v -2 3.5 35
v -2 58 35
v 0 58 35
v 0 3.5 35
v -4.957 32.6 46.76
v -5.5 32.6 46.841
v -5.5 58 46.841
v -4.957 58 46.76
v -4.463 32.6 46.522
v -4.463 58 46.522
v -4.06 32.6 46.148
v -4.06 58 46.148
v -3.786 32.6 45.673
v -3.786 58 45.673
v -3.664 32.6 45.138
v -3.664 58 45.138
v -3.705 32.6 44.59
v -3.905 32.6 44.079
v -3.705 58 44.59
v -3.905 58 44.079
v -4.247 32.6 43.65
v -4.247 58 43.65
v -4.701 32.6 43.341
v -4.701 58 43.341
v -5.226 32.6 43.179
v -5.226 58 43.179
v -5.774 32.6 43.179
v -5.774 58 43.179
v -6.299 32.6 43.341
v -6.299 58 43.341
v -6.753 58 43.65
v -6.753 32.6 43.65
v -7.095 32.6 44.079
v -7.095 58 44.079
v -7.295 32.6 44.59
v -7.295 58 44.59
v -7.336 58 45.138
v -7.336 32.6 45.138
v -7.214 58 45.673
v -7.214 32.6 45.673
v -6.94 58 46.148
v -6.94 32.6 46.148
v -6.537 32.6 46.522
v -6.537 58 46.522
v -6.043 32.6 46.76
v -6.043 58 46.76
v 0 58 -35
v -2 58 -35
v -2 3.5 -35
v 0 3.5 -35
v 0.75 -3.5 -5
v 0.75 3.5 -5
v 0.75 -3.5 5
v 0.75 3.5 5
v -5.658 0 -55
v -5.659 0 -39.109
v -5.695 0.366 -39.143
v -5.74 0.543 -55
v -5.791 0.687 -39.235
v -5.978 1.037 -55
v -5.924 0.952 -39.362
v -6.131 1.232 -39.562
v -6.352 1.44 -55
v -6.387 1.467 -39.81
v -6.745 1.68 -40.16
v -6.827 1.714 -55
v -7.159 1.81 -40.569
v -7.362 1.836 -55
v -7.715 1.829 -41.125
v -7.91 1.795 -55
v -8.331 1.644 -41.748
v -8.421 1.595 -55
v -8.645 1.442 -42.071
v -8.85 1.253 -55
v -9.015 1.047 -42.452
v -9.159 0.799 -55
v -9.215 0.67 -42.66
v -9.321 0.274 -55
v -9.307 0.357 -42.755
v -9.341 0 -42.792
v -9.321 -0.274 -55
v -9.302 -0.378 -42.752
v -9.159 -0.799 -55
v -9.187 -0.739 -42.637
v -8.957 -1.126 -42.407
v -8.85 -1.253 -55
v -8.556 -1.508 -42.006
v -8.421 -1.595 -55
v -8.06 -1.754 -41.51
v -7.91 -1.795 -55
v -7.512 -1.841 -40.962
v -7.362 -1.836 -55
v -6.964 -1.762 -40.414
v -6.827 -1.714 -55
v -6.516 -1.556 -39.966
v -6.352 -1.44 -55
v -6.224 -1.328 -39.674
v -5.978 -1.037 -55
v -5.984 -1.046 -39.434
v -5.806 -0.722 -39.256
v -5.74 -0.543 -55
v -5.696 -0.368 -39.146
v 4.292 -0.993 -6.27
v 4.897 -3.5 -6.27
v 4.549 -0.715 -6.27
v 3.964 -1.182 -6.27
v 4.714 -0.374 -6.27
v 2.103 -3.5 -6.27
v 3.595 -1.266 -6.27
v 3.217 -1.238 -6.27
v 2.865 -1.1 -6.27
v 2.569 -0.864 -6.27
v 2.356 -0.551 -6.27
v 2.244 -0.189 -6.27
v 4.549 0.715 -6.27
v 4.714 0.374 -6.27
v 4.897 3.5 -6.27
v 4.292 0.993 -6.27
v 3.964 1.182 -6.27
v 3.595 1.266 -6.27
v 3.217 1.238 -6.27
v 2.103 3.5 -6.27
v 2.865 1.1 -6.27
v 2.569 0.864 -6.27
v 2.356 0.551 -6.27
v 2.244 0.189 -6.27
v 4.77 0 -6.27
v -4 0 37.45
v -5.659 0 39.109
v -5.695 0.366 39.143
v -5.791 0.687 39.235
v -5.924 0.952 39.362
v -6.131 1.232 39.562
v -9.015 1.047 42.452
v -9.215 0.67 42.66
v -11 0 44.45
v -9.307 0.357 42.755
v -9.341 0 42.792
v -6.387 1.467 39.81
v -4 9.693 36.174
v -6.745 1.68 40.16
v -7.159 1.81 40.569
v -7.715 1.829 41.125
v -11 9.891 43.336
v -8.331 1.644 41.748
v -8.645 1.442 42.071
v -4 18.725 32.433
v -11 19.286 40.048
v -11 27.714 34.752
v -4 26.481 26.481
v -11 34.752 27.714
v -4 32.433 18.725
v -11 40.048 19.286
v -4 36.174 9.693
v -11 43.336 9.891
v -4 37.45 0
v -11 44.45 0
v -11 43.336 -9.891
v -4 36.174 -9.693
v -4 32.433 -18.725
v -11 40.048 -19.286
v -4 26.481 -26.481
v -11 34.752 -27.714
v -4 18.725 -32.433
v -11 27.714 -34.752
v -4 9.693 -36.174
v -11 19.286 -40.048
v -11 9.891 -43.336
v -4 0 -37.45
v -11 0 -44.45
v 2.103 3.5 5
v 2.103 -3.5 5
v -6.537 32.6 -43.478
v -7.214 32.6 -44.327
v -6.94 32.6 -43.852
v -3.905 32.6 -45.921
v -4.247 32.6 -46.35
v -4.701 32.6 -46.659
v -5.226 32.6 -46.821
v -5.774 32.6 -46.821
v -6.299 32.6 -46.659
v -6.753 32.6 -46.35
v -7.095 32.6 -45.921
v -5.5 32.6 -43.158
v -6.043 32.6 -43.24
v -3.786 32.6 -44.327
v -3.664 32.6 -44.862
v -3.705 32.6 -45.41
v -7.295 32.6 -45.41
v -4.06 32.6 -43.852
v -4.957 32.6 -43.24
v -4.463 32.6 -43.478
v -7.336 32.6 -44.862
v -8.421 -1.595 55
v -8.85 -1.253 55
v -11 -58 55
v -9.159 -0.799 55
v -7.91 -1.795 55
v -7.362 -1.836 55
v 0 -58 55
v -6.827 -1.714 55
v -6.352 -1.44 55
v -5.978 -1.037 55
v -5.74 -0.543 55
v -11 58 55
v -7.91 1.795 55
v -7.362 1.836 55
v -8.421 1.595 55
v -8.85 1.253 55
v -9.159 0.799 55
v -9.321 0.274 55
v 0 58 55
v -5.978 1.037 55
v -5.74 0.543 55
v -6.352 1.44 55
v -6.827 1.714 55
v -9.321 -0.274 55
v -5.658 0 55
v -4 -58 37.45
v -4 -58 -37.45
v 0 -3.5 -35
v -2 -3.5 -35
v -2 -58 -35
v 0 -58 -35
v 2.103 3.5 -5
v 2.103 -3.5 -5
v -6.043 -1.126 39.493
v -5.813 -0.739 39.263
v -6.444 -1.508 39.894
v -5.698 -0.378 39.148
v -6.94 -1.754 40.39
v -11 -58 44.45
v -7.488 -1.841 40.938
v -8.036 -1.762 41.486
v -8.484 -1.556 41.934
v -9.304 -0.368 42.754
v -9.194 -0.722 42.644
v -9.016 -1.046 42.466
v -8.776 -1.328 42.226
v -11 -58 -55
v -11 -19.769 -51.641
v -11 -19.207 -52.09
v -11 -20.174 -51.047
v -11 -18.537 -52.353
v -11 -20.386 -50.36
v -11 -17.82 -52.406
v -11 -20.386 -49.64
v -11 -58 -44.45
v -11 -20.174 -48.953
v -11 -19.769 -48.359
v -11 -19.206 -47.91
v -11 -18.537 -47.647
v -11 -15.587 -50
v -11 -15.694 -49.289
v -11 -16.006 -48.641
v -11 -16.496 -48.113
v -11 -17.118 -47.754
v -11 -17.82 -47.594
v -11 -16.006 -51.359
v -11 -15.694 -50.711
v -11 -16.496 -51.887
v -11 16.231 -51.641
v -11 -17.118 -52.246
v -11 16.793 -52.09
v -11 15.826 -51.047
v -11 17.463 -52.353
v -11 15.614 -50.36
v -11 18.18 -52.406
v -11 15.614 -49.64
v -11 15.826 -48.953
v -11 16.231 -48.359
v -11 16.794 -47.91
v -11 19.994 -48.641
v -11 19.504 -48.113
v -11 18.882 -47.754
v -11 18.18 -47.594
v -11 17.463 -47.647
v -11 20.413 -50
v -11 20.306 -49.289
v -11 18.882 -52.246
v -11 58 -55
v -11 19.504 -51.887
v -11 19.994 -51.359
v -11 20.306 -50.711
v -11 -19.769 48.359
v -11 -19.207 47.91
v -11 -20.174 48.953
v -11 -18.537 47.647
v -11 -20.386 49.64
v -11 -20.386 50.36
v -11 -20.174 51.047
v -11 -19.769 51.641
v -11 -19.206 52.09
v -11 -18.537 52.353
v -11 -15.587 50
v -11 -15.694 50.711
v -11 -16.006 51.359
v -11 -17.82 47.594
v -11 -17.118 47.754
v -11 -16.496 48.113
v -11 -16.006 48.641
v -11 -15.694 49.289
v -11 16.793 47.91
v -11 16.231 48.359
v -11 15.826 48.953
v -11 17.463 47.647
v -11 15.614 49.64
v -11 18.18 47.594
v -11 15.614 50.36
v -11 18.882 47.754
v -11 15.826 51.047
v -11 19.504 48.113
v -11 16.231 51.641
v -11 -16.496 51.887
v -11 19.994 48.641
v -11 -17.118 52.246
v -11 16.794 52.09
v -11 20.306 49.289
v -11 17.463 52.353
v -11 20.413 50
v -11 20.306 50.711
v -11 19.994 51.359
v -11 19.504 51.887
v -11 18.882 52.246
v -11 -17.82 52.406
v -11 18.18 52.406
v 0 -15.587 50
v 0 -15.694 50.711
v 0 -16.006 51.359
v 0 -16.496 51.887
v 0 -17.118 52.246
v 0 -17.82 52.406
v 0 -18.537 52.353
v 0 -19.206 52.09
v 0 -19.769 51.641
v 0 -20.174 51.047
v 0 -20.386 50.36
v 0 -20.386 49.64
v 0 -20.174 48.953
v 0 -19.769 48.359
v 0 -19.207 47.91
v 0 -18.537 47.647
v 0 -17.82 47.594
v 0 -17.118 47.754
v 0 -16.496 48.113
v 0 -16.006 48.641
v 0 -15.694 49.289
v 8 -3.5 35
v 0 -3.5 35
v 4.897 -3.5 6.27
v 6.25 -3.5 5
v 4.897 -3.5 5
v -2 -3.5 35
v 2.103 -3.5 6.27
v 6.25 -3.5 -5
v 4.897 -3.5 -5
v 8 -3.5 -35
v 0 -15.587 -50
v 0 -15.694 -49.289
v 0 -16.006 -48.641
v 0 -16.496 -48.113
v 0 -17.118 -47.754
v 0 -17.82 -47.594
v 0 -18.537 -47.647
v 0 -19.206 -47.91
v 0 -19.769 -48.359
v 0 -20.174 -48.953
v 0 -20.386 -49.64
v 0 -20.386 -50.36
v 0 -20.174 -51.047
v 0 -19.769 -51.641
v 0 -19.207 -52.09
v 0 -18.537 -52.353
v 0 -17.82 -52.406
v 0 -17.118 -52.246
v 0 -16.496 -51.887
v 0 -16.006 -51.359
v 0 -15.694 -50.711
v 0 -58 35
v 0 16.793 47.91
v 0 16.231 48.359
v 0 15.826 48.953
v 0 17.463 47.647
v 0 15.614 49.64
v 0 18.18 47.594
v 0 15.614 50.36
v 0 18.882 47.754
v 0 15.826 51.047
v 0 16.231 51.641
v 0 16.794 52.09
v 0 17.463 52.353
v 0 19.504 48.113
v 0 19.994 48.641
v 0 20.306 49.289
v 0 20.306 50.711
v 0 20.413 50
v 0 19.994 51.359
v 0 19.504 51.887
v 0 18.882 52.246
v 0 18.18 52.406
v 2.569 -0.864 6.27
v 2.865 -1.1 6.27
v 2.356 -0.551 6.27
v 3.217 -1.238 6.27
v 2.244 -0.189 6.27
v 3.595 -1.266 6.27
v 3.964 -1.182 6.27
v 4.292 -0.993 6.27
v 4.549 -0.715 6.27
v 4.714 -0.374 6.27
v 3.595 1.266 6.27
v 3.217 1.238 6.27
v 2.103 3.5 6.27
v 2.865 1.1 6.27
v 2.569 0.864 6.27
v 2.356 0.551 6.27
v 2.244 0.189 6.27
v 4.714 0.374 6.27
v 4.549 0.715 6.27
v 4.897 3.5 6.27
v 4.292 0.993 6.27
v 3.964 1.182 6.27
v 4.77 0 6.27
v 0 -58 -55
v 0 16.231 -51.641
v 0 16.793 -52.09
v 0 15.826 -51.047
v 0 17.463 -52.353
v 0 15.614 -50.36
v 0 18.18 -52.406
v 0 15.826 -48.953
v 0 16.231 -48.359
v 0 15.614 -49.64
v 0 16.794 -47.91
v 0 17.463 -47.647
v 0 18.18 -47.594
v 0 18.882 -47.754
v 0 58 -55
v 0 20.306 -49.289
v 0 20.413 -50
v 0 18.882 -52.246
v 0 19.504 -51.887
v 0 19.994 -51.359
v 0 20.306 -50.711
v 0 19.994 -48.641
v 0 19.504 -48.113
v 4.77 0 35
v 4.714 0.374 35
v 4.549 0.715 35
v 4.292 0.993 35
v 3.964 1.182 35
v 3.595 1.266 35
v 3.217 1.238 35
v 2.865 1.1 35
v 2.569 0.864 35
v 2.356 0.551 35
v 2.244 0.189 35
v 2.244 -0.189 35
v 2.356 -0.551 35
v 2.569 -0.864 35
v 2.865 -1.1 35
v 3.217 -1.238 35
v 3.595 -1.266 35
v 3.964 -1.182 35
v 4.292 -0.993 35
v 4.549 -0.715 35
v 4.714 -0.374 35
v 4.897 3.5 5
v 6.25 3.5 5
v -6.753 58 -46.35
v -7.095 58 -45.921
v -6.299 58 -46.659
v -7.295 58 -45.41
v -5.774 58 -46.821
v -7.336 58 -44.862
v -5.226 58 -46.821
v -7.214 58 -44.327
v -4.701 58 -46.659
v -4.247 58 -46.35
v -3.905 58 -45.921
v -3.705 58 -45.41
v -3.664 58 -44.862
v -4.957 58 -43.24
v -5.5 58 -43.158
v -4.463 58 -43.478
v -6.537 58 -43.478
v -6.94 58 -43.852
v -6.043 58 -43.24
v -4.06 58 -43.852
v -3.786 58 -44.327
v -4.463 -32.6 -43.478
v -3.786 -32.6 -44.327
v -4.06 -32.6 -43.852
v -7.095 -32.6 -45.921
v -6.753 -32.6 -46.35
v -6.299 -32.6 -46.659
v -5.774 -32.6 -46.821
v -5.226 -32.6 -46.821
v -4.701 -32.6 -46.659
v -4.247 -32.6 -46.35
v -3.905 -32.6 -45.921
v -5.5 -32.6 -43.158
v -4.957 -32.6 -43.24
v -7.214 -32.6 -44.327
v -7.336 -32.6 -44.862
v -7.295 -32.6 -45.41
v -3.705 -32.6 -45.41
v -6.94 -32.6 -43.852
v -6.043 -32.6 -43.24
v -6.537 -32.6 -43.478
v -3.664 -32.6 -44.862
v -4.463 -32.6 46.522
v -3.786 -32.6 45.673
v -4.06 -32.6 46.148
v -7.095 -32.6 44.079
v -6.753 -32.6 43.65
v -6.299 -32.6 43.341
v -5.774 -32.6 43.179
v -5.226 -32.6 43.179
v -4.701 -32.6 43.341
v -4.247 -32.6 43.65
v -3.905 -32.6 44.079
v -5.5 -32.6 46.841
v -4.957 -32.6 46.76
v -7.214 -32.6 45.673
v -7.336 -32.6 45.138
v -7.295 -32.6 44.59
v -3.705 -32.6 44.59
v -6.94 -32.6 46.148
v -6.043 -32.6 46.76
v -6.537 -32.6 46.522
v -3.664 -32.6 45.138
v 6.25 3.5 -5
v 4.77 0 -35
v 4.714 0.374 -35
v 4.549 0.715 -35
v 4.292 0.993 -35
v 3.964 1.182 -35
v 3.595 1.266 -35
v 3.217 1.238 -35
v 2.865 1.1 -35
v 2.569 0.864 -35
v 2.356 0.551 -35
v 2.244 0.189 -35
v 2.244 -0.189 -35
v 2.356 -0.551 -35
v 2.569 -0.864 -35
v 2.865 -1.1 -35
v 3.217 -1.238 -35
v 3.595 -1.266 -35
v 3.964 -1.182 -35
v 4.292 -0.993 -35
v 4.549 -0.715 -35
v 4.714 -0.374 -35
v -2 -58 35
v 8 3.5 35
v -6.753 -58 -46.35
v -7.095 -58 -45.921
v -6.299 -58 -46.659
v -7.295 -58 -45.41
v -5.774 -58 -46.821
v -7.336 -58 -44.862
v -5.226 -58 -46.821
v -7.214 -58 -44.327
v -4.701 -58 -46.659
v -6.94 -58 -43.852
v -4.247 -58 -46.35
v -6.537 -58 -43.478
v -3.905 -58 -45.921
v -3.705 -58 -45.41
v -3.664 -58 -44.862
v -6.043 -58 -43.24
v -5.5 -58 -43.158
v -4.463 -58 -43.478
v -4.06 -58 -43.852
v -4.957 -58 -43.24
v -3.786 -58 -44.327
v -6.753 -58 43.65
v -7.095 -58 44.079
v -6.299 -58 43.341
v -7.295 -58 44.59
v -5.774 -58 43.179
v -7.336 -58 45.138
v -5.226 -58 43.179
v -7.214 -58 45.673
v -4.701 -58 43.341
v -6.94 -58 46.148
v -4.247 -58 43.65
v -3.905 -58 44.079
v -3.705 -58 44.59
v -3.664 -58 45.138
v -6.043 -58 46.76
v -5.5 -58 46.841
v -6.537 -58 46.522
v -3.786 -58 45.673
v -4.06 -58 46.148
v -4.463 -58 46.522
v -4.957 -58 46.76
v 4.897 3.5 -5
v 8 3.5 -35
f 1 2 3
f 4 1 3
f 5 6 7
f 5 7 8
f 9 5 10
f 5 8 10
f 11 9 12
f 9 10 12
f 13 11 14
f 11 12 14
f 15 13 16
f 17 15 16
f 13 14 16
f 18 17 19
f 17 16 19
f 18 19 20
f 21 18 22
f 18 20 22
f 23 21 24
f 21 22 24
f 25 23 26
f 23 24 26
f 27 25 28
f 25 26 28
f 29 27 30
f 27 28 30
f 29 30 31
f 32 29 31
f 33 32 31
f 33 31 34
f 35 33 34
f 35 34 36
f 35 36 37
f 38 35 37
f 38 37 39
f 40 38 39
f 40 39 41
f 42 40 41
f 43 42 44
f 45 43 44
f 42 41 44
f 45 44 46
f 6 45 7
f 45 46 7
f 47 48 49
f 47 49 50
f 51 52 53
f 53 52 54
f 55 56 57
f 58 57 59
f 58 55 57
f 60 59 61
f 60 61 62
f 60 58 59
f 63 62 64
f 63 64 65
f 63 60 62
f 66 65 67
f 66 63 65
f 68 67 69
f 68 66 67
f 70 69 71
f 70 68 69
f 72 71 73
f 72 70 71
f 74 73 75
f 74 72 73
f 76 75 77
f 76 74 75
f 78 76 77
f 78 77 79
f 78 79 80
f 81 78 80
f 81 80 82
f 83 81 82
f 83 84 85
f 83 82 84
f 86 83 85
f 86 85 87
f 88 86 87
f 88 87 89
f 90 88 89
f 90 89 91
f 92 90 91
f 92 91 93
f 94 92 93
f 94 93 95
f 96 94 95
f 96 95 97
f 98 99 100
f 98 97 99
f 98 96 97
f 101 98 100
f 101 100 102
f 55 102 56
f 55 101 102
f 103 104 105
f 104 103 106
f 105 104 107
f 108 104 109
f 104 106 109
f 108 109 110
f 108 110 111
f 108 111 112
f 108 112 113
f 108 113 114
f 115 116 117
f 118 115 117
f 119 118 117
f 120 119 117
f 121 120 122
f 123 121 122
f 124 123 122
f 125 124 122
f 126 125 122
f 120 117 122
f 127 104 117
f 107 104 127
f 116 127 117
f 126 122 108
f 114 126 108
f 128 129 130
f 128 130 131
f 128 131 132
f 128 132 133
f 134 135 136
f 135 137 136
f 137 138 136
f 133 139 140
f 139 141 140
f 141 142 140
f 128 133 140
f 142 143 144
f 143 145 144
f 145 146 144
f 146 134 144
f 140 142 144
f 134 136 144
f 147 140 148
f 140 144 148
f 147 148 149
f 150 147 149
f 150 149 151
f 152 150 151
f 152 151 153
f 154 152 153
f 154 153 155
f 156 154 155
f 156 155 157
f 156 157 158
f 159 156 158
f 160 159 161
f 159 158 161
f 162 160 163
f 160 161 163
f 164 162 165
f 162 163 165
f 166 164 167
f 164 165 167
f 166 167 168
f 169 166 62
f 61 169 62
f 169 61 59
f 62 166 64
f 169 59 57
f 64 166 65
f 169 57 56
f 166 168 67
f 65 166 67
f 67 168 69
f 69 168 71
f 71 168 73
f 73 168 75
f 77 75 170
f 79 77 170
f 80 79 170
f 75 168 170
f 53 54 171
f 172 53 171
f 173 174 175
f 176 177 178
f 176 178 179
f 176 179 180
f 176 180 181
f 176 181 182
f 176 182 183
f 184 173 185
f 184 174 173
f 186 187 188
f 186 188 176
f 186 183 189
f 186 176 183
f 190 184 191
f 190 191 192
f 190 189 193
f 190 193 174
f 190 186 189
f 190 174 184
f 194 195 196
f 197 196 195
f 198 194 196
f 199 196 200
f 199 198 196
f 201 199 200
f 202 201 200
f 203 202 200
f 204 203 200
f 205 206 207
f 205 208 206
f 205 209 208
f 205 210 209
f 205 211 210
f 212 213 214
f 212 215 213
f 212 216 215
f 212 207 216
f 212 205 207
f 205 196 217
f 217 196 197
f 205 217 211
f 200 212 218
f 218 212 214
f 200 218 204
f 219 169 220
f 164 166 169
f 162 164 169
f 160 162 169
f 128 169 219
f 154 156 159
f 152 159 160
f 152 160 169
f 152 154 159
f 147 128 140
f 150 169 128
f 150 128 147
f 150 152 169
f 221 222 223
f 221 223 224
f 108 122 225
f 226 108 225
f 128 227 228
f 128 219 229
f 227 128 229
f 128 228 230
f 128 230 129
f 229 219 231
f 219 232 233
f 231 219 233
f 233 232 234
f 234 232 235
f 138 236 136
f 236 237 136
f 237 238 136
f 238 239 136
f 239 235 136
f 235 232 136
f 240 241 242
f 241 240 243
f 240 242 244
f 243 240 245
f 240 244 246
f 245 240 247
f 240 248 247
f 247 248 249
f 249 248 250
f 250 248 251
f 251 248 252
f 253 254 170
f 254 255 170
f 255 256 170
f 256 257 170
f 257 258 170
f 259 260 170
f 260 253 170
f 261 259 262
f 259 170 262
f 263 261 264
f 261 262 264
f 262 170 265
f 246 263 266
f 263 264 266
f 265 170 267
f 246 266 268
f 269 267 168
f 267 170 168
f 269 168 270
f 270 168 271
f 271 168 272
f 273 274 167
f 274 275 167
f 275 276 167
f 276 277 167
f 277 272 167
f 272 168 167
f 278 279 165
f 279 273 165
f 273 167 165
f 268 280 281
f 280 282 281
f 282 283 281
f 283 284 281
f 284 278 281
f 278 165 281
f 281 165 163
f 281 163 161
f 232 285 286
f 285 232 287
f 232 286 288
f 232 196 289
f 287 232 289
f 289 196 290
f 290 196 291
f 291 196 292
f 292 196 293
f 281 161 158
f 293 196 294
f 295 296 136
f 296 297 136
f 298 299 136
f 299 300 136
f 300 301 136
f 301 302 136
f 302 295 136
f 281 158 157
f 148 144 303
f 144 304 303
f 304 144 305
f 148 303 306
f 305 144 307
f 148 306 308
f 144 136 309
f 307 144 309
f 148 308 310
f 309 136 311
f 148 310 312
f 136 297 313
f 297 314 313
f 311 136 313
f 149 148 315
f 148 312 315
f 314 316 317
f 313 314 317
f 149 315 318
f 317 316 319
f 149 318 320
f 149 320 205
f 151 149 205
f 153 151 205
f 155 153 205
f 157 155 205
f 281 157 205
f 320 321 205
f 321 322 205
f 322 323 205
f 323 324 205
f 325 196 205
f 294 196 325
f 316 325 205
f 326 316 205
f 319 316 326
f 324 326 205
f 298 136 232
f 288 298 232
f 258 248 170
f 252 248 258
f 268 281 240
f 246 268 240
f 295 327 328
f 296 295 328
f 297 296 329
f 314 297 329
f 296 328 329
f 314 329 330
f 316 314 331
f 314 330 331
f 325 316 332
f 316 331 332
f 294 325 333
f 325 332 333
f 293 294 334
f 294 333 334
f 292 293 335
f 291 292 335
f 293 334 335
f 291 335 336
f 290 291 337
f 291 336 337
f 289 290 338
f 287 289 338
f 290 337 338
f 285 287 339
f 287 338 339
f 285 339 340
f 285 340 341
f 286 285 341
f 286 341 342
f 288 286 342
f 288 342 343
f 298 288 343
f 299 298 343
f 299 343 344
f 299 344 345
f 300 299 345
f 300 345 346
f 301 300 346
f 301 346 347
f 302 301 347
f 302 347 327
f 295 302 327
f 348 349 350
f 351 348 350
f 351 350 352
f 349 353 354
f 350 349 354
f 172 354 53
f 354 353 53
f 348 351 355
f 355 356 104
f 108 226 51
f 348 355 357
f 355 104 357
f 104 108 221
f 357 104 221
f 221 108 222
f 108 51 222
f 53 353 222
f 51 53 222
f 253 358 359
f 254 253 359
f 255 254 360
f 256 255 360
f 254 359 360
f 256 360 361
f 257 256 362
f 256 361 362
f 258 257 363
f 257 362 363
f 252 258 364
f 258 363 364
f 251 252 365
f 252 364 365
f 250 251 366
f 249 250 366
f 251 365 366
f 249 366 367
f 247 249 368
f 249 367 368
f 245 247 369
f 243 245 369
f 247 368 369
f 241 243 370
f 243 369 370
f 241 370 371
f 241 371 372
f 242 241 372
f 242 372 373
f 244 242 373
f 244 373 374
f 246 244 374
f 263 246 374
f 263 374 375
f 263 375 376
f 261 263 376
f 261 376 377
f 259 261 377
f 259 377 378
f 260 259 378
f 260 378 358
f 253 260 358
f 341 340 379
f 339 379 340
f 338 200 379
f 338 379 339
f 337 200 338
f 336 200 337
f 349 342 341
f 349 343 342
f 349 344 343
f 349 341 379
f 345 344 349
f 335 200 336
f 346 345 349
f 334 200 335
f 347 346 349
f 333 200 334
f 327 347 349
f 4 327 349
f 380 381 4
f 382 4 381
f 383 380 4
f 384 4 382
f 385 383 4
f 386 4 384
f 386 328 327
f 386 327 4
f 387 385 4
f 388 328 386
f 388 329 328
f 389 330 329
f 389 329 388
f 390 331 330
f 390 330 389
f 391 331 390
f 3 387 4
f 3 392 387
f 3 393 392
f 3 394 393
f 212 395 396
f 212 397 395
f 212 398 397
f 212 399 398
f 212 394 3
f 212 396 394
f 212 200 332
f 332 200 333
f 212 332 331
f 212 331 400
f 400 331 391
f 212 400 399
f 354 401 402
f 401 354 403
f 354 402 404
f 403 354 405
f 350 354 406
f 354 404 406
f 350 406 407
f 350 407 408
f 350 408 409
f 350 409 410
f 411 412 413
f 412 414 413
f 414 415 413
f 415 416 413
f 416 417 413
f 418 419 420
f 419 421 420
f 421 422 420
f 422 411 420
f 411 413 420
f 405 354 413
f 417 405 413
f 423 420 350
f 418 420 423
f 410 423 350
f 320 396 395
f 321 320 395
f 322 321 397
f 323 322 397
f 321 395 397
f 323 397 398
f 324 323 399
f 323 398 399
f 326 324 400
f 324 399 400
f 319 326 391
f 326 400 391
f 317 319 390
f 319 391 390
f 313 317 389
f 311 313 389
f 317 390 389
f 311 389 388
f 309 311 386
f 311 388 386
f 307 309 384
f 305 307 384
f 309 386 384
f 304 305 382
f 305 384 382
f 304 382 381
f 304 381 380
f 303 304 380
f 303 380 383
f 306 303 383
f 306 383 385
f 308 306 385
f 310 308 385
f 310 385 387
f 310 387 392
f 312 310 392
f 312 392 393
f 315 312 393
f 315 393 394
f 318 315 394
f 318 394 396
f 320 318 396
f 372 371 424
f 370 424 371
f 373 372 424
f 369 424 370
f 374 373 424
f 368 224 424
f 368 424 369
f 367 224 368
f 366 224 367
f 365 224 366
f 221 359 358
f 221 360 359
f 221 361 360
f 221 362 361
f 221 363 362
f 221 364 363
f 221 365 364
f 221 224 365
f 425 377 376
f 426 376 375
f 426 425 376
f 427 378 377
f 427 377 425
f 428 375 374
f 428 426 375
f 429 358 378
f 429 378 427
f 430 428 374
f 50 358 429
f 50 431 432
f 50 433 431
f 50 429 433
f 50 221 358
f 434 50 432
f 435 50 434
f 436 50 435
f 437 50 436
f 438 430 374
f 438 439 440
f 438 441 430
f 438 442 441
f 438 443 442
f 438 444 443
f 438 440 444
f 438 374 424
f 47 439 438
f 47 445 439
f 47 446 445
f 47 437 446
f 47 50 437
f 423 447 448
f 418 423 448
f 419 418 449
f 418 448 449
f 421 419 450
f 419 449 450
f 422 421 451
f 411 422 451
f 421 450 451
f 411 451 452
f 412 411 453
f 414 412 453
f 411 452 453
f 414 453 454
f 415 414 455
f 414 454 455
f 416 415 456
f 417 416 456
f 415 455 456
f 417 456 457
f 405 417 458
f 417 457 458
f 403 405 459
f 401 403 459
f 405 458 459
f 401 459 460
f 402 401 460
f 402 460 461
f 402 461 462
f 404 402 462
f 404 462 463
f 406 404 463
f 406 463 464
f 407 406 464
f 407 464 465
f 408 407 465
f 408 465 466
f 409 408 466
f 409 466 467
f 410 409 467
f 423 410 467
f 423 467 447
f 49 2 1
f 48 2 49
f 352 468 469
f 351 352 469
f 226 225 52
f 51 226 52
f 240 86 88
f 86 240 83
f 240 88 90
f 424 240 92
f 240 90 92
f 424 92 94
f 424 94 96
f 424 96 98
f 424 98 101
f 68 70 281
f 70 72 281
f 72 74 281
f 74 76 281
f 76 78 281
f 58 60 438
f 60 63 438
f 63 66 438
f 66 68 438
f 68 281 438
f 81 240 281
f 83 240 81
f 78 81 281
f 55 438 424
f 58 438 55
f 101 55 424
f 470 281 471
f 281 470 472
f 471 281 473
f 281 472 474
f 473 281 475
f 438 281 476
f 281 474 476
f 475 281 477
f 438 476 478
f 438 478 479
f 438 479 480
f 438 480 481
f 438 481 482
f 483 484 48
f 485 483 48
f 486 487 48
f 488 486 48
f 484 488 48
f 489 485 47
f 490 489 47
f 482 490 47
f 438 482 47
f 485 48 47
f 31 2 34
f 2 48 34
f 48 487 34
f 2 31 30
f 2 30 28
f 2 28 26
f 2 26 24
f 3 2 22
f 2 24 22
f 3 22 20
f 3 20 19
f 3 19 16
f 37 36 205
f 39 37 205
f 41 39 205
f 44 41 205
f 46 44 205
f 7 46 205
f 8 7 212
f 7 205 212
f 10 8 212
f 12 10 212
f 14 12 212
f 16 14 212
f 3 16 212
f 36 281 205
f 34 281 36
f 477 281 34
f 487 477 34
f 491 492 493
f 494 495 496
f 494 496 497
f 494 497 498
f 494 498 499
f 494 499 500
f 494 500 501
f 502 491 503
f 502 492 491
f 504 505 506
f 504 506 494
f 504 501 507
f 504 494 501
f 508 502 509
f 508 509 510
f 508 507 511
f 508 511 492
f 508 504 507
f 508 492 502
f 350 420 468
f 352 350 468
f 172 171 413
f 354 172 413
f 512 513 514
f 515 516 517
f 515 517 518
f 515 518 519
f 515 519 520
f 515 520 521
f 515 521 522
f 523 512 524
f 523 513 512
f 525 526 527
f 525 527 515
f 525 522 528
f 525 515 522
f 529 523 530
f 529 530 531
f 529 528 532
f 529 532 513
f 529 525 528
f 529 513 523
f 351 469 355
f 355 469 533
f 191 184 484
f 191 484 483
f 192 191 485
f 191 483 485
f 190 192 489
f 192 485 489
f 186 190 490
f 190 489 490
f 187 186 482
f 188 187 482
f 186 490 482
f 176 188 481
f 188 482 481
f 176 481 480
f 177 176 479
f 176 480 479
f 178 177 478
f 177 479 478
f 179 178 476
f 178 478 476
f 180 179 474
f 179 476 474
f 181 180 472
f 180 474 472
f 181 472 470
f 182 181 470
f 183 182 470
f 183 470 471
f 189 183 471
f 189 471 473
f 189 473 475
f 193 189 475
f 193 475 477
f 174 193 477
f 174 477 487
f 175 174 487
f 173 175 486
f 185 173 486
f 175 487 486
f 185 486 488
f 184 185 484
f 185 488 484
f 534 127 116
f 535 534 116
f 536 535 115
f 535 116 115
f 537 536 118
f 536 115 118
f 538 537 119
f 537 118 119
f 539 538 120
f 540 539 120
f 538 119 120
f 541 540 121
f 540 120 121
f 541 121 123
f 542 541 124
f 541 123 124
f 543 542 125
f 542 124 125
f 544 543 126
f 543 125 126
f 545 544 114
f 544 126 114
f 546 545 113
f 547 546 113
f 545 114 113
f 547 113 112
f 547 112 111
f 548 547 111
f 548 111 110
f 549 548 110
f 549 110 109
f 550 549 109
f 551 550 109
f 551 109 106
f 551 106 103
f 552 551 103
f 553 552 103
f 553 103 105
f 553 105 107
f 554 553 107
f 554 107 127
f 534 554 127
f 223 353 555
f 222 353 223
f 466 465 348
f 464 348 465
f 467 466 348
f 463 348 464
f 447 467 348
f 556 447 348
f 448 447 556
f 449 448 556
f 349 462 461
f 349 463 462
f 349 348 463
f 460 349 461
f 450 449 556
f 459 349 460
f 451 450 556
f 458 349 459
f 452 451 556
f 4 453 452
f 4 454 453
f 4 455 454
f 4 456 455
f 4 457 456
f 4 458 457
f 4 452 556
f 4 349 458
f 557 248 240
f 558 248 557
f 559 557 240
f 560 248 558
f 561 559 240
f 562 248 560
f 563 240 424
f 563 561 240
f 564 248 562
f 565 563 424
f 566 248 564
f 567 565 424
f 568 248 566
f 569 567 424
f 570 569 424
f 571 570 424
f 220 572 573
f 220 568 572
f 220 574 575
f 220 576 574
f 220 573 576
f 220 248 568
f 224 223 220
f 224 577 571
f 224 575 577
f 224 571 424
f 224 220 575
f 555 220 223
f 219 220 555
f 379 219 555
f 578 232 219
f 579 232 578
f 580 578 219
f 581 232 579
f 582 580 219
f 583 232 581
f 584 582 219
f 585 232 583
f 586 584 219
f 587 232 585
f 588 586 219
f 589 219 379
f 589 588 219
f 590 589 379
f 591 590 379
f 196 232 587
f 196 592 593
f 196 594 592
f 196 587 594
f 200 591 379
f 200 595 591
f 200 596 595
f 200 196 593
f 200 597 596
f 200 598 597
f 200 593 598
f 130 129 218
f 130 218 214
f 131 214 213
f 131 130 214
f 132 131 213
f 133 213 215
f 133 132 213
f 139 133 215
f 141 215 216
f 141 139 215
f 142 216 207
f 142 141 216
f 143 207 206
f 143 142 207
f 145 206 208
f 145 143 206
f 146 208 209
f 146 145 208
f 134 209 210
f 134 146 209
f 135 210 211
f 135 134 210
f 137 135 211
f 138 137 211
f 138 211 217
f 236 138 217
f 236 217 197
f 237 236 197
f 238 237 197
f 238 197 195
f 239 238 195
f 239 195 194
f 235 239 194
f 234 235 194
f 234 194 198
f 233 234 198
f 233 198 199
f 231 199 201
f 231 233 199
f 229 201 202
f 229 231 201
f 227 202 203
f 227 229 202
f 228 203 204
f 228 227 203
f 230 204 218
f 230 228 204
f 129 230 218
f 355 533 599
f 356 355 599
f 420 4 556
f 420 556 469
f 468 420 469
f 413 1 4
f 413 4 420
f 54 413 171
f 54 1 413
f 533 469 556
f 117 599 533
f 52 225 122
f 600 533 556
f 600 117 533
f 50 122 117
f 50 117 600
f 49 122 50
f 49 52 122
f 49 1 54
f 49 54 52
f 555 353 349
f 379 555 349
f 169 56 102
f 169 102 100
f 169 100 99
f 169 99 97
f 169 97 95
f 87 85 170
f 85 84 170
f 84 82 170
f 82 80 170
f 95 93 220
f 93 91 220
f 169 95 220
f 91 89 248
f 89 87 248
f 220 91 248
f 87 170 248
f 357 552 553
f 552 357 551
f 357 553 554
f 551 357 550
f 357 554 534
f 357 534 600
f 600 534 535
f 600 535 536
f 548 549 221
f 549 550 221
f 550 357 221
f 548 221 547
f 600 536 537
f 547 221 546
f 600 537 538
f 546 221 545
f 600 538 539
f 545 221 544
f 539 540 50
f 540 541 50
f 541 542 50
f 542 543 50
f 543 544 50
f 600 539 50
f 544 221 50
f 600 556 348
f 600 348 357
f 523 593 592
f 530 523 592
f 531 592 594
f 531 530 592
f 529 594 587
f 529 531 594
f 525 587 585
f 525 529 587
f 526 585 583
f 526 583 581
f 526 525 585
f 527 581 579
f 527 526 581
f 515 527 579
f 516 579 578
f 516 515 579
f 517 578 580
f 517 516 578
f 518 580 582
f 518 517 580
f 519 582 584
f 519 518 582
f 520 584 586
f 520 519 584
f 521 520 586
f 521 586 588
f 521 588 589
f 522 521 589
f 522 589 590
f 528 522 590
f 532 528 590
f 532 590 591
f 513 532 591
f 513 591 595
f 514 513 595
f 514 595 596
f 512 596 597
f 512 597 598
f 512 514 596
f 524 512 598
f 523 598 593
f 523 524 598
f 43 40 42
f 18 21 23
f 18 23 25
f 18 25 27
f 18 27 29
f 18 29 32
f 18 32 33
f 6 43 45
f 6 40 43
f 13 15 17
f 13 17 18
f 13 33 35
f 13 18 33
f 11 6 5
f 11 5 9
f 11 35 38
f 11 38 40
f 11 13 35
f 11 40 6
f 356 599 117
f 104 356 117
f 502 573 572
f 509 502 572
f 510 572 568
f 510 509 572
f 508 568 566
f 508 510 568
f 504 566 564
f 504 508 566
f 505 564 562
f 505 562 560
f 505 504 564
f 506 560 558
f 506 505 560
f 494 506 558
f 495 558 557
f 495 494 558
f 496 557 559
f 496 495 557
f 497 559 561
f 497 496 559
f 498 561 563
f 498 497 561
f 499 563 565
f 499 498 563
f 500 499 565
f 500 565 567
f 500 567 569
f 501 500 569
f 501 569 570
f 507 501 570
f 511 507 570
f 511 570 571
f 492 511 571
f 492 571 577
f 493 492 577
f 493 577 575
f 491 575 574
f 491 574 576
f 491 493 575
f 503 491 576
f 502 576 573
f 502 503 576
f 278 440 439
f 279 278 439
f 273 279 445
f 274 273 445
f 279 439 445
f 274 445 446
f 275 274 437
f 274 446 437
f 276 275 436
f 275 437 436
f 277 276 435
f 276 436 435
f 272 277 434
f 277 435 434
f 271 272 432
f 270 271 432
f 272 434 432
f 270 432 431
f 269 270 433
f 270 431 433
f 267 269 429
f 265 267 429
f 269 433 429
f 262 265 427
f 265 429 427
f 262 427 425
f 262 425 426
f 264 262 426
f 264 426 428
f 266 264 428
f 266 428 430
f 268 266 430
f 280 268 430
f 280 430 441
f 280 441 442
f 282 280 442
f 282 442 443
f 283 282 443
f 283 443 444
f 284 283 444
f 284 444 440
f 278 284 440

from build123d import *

# Parameters (mm, degrees)
SKETCH2_W              = 11
SKETCH2_H              = 116
BOSS_EXTRUDE2_DEPTH    = 109.999999964
SKETCH3_W              = 2
SKETCH3_H              = 70
CUT_EXTRUDE1_DEPTH     = 129.848748531
CUT_EXTRUDE2_DEPTH     = 7
CUT_EXTRUDE2_DRAFT     = -45
SKETCH6_W              = 70
SKETCH6_H              = 7
BOSS_EXTRUDE3_DEPTH    = 10
SKETCH7_R              = 1.27
CUT_EXTRUDE3_DEPTH     = 108.633637835
CUT_EXTRUDE4_DEPTH     = 84.23610994
CUT_EXTRUDE5_START     = -109.999999964
CUT_EXTRUDE5_OUTLINE_R = 1.8415
CUT_EXTRUDE5_DEPTH     = 109.999999964
SKETCH10_R             = 1.8415
CUT_EXTRUDE6_DEPTH     = 25.4
CUT_EXTRUDE7_START     = -25.4
SKETCH11_R             = 1.8415
CUT_EXTRUDE7_DEPTH     = 25.4
SKETCH12_R             = 2.413
CUT_EXTRUDE8_DEPTH     = 81.684571085


# Read off the part's stored shape, not the designer's step: Cut-Extrude5
with BuildPart() as part:
    # Sketch2 → Boss-Extrude2 (new body)
    with BuildSketch(Plane.XY.offset(54.999999982)):
        with Locations((-5.5, 0)):
            Rectangle(SKETCH2_W, SKETCH2_H)
    extrude(amount=-BOSS_EXTRUDE2_DEPTH)

    # Sketch3 → Cut-Extrude1 (cut, through all)
    with BuildSketch(Plane(origin=(0, 58, 0), x_dir=(1, 0, 0), z_dir=(0, 1, 0))):
        with Locations((-1, 1.8e-08)):
            Rectangle(SKETCH3_W, SKETCH3_H)
    extrude(amount=-CUT_EXTRUDE1_DEPTH, mode=Mode.SUBTRACT)


with BuildPart() as cut_extrude2_tool:
    # Sketch5 → Cut-Extrude2 (with draft: the straight prism first)
    with BuildSketch(Plane.ZY.offset(11)):
        with BuildLine():
            Line((-44.45, 0), (-44.45, -77.05))
            Line((-44.45, -77.05), (44.45, -77.05))
            Line((44.45, -77.05), (44.45, 0))
            ThreePointArc((44.45, 0), (0, 44.45), (-44.45, 0))
        make_face()
    extrude(amount=-CUT_EXTRUDE2_DEPTH)
    # Cut-Extrude2: the draft: its side faces are tilted about the plane it starts from
    cut_extrude2_sides = [cut_extrude2_tool.faces().sort_by_distance(p)[0] for p in [
        (-7.5, -38.525, -44.45),
        (-7.5, -77.05, 0),
        (-7.5, -38.525, 44.45),
        (-7.5, 44.45, 0),
    ]]
    draft(cut_extrude2_sides, Plane.ZY.offset(11), CUT_EXTRUDE2_DRAFT)


with BuildPart() as part_1:
    add(part.part)

    # Cut-Extrude2: cut by cut_extrude2_tool
    add(cut_extrude2_tool.part, mode=Mode.SUBTRACT)

    # Sketch6 → Boss-Extrude3 (add)
    with BuildSketch(Plane(origin=(-2, 0, 0), x_dir=(0, 0, -1), z_dir=(1, 0, 0))):
        with Locations((1.8e-08, 0)):
            Rectangle(SKETCH6_W, SKETCH6_H)
    extrude(amount=BOSS_EXTRUDE3_DEPTH)

    # Sketch7 → Cut-Extrude3 (cut, through all)
    with BuildSketch(Plane.XY.offset(34.999999982)):
        with Locations((3.5, 0)):
            Circle(SKETCH7_R)
    extrude(amount=-CUT_EXTRUDE3_DEPTH, mode=Mode.SUBTRACT)

    # Sketch8 → Cut-Extrude4 (cut, through all)
    with BuildSketch(Plane(origin=(0, 3.5, 0), x_dir=(1, 0, 0), z_dir=(0, 1, 0))):
        Polygon((0.75, 5), (0.75, -5), (2.103, -5), (2.103, -6.27), (4.897, -6.27), (4.897, -5), (6.25, -5), (6.25, 5), (4.897, 5), (4.897, 6.27), (2.103, 6.27), (2.103, 5), align=None)
    extrude(amount=-CUT_EXTRUDE4_DEPTH, mode=Mode.SUBTRACT)

    # Cut-Extrude5 outline → Cut-Extrude5 (cut)
    with BuildSketch(Plane.XY.offset(54.999999982).offset(CUT_EXTRUDE5_START)):
        with Locations((-7.5, 0)):
            Circle(CUT_EXTRUDE5_OUTLINE_R)
    extrude(amount=CUT_EXTRUDE5_DEPTH, mode=Mode.SUBTRACT)

    # Sketch10 → Cut-Extrude6 (cut)
    with BuildSketch(Plane(origin=(0, 58, 0), x_dir=(1, 0, 0), z_dir=(0, 1, 0))):
        with Locations(Location((-5.5, -44.999999982, 0), (0, 0, 270))):
            Circle(SKETCH10_R)
        with Locations(Location((-5.5, 44.999999982, 0), (0, 0, 270))):
            Circle(SKETCH10_R)
    extrude(amount=-CUT_EXTRUDE6_DEPTH, mode=Mode.SUBTRACT)

    # Sketch11 → Cut-Extrude7 (cut)
    with BuildSketch(Plane.XZ.offset(58).offset(CUT_EXTRUDE7_START)):
        with Locations(Location((-5.5, 44.999999982, 0), (0, 0, 90))):
            Circle(SKETCH11_R)
        with Locations(Location((-5.5, -44.999999982, 0), (0, 0, 90))):
            Circle(SKETCH11_R)
    extrude(amount=CUT_EXTRUDE7_DEPTH, mode=Mode.SUBTRACT)

    # Sketch12 → Cut-Extrude8 (cut, through all)
    with BuildSketch(Plane(origin=(0, 0, 0), x_dir=(0, 0, -1), z_dir=(1, 0, 0))):
        with Locations(Location((-49.999999982, 18, 0), (0, 0, 90))):
            Circle(SKETCH12_R)
        with Locations(Location((-49.999999982, -18, 0), (0, 0, 90))):
            Circle(SKETCH12_R)
        with Locations(Location((49.999999982, -18, 0), (0, 0, 90))):
            Circle(SKETCH12_R)
        with Locations(Location((49.999999982, 18, 0), (0, 0, 90))):
            Circle(SKETCH12_R)
    extrude(amount=-CUT_EXTRUDE8_DEPTH, mode=Mode.SUBTRACT)


solid = part_1.part
